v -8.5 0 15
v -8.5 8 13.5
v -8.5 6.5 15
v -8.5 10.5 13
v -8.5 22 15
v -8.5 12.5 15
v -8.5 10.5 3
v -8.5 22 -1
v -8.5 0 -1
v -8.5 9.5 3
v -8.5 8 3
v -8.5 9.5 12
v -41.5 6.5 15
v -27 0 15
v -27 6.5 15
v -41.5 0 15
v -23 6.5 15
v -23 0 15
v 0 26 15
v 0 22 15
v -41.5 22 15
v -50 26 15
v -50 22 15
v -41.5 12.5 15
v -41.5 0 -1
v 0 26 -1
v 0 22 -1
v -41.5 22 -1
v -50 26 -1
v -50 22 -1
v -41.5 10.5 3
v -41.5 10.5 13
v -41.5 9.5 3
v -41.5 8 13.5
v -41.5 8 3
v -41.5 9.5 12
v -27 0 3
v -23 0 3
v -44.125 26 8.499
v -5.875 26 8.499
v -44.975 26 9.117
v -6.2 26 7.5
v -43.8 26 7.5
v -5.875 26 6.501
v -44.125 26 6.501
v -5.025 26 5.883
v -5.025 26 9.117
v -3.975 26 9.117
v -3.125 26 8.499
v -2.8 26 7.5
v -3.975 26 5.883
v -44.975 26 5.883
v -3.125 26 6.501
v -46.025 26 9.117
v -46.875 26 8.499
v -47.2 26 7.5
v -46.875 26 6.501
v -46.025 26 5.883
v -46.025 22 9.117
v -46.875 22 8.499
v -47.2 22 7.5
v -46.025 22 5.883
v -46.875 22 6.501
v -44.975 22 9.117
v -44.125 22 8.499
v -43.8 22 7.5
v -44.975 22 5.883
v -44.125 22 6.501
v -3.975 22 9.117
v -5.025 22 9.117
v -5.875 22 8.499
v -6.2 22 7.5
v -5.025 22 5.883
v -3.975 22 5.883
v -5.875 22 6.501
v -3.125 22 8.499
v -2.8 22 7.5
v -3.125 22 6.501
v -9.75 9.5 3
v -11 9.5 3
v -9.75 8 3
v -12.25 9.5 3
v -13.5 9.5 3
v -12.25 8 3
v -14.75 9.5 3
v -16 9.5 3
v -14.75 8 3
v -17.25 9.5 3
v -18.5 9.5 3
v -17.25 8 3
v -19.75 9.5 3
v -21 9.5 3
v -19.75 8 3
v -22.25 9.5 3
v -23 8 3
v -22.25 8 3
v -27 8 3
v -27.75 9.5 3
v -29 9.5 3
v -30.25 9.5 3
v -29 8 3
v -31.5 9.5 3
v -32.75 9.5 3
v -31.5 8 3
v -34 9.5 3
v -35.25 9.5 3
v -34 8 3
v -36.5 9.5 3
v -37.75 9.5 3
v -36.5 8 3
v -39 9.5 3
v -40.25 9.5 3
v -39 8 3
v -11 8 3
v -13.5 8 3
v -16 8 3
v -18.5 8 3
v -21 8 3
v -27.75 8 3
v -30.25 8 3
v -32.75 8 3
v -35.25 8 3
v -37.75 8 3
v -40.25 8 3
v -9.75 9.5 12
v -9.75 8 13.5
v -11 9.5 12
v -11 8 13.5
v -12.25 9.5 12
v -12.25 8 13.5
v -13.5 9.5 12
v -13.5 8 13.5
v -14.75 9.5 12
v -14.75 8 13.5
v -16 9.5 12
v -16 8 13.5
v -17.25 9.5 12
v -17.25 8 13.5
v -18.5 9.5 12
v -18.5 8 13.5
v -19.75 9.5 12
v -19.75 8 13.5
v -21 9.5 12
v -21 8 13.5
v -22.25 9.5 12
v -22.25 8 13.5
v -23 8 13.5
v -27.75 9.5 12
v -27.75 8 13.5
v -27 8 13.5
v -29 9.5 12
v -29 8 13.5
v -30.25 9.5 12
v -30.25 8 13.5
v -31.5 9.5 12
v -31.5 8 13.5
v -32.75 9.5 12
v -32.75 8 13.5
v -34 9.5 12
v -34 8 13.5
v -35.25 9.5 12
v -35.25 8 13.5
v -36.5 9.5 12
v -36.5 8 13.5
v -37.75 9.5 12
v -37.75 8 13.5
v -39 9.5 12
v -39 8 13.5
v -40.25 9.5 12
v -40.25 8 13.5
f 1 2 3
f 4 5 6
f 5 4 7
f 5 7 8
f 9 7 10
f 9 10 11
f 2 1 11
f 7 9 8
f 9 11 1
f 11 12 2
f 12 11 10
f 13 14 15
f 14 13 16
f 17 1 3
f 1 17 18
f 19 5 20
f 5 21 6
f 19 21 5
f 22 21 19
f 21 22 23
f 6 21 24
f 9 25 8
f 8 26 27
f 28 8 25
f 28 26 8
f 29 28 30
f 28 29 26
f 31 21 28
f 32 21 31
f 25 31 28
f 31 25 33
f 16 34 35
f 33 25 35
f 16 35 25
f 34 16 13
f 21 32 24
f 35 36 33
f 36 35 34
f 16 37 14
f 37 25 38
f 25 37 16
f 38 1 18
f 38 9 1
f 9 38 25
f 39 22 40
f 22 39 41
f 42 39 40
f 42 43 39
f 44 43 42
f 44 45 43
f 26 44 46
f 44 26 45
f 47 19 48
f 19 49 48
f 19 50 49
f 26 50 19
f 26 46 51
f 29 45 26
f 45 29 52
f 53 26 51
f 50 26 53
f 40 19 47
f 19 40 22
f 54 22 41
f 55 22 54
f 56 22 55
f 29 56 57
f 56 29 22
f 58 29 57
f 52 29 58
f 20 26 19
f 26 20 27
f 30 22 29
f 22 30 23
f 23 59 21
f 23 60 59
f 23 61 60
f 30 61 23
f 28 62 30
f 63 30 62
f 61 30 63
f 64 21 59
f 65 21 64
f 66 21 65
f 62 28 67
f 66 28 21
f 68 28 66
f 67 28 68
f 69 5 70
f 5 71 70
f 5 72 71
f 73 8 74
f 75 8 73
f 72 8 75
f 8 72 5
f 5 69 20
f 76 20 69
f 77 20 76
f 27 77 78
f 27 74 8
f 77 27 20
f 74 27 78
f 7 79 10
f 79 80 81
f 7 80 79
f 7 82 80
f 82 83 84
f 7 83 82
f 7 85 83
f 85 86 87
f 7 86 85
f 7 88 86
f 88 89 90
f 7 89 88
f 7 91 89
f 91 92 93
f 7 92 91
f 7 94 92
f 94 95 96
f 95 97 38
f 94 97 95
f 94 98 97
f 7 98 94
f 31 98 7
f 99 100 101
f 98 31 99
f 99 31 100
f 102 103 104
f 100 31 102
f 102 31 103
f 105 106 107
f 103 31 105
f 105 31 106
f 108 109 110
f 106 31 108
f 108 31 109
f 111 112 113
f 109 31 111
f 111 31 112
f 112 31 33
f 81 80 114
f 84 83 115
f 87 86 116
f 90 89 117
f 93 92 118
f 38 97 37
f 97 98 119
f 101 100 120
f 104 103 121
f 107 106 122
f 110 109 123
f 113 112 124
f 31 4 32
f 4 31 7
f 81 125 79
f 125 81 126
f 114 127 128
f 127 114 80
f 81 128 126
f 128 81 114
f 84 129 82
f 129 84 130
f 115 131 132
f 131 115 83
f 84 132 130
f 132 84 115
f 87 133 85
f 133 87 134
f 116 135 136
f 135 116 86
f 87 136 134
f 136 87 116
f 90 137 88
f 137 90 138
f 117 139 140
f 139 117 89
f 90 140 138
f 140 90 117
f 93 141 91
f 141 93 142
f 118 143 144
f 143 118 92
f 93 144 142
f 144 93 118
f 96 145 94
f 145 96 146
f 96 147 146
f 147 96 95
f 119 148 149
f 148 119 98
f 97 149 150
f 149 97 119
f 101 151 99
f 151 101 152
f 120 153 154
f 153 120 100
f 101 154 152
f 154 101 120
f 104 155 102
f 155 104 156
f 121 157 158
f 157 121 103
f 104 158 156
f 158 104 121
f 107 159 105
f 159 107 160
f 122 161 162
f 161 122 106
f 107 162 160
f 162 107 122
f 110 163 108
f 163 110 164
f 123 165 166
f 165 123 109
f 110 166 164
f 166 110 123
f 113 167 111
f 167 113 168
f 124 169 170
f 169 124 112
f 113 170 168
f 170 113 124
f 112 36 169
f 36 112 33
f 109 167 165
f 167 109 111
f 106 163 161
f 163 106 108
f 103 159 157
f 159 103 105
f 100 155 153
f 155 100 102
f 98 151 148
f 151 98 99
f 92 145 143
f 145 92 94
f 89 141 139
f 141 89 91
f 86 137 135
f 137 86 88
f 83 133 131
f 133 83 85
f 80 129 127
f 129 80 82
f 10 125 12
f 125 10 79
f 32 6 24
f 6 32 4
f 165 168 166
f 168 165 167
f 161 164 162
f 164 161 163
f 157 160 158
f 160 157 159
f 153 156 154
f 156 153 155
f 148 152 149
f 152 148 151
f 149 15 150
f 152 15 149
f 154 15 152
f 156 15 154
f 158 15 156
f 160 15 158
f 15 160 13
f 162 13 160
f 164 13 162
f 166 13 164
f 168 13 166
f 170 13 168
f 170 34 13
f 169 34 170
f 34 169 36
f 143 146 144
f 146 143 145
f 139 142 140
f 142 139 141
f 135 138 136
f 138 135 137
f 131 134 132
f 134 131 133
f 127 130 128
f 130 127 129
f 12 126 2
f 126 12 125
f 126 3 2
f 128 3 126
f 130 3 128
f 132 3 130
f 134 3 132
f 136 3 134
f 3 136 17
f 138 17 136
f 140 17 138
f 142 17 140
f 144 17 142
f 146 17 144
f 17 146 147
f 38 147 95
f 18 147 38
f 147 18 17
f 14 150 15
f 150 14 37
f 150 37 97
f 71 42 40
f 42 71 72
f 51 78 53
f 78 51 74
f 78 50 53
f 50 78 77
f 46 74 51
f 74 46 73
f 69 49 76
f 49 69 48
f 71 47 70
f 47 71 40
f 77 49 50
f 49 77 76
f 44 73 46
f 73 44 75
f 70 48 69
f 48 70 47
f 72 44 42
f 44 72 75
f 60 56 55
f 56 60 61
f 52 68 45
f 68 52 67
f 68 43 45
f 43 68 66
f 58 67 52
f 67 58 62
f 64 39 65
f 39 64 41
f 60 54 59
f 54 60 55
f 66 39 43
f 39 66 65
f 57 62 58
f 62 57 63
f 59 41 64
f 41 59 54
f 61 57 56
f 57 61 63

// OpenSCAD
// PRUSA iteration3
// Y belt holder
// GNU GPL v3
// Josef Průša <iam@josefprusa.cz> and contributors
// http://www.reprap.org/wiki/Prusa_Mendel
// http://prusamendel.org


module belt_holder_base(){
 translate([-33-8.5,0,-1]) cube([33,15,16]); 
 translate([-33-8.5,11,-1]) cube([33,15,16]);
 translate([-50,22,-1]) cube([50,4,16]);	
}

module belt_holder_beltcut(){
 // Belt slit
 translate([-66,-0.5+10,3]) cube([67,1,15]);
 // Smooth insert cutout
 translate([-66,-0.5+10,12]) rotate([45,0,0]) cube([67,15,15]);
 // Individual teeth
 for ( i = [3.4 : 11] ){
  translate([0-i*2.5,-0.5+8+0.5,3]) cube([1.25,2.5,15]);
 }
 for ( i = [18 : 11.1] ){
  translate([0-i*2.5,-0.5+8+0.5,3]) cube([1.25,2.5,15]);
}
 // Middle opening
 translate([-2-25,-1,3]) cube([4,11,15]);	
}

module belt_holder_holes(){
 translate([-4.5,0,7.5]) rotate([-90,0,0]) cylinder(h=30, r=1.7, $fn=10);
 translate([-45.5,0,7.5]) rotate([-90,0,0]) cylinder(h=30, r=1.7, $fn=10);
}

// Final part
module belt_holder(){
 difference(){
  belt_holder_base();
  belt_holder_beltcut();
  belt_holder_holes();
 }
}

belt_holder();
